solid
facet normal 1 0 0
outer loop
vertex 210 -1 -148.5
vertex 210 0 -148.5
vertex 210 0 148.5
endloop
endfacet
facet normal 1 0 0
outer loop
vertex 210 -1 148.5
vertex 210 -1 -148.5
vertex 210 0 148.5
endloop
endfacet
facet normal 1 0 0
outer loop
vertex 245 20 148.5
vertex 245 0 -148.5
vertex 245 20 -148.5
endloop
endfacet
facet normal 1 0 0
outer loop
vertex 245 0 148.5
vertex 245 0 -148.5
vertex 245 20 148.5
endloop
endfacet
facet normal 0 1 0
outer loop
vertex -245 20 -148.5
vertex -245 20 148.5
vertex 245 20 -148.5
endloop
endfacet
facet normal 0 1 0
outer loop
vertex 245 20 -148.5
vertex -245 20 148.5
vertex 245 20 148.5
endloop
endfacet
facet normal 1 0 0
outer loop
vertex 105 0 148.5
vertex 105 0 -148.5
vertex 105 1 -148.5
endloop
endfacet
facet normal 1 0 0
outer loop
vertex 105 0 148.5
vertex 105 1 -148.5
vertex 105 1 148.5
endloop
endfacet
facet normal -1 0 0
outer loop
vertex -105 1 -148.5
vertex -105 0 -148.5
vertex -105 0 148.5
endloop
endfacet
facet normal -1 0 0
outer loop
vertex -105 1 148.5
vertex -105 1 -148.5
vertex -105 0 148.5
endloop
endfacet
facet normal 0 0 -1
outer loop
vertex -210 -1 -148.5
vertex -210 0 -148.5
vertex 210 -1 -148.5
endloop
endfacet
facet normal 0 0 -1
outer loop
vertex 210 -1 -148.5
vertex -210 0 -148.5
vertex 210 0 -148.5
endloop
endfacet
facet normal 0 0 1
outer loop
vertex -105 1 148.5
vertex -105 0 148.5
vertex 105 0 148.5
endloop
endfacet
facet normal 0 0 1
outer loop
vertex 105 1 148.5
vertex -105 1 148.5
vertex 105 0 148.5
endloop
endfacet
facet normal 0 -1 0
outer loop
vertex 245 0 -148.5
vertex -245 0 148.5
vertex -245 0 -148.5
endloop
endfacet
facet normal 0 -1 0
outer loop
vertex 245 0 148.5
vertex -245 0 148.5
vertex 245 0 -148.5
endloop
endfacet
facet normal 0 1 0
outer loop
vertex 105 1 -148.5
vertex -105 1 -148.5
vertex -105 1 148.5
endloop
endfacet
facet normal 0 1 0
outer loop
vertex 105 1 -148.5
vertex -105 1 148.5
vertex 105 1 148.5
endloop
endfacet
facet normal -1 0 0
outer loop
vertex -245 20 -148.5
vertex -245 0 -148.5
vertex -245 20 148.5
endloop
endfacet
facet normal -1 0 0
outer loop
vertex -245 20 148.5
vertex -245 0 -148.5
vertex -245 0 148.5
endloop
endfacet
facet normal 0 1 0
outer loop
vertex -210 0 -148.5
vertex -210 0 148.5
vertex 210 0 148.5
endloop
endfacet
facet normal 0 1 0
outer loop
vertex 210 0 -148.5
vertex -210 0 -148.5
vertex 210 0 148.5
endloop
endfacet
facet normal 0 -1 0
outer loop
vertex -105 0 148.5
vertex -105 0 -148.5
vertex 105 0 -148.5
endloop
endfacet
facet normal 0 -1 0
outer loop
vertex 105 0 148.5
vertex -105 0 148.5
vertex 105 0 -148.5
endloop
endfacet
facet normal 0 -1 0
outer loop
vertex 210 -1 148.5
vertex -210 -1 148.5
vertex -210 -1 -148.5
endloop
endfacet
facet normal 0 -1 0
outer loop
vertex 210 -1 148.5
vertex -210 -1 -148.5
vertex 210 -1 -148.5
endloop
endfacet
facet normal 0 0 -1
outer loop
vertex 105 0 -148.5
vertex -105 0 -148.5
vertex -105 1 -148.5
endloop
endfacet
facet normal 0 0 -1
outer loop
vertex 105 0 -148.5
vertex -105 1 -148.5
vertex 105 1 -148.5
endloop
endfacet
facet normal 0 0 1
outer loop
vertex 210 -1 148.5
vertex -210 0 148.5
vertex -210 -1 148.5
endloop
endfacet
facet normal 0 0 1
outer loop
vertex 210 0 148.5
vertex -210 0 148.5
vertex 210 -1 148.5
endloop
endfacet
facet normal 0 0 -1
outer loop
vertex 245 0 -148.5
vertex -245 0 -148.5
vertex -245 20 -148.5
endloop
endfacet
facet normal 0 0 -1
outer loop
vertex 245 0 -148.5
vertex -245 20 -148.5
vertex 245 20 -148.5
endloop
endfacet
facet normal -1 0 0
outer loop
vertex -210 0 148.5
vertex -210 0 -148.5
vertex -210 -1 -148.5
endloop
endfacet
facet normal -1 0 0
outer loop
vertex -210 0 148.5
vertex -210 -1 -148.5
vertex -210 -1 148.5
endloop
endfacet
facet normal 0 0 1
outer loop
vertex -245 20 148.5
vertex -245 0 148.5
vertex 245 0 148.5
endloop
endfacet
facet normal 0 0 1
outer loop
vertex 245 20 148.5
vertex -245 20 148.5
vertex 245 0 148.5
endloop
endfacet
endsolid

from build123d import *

# Parameters (mm, degrees)
F0_W     = 490
F0_H     = 297
F1_DEPTH = 20
F2_W     = 210
F2_H     = 297
F4_DEPTH = 1
F3_W     = 420
F3_H     = 297
F5_DEPTH = 1


with BuildPart() as f1:
    # F0 (on Front) → F1 (new body)
    with BuildSketch(Plane.XZ):
        Rectangle(F0_W, F0_H)
    extrude(amount=-F1_DEPTH)


with BuildPart() as f4:
    # F2 (on face) → F4 (new body)
    with BuildSketch(Plane.XZ):
        Rectangle(F2_W, F2_H)
    extrude(amount=-F4_DEPTH)


with BuildPart() as f5:
    # F3 (on face) → F5 (new body)
    with BuildSketch(Plane.XZ):
        Rectangle(F3_W, F3_H)
    extrude(amount=F5_DEPTH)


solid = Compound([f1.part, f4.part, f5.part])
